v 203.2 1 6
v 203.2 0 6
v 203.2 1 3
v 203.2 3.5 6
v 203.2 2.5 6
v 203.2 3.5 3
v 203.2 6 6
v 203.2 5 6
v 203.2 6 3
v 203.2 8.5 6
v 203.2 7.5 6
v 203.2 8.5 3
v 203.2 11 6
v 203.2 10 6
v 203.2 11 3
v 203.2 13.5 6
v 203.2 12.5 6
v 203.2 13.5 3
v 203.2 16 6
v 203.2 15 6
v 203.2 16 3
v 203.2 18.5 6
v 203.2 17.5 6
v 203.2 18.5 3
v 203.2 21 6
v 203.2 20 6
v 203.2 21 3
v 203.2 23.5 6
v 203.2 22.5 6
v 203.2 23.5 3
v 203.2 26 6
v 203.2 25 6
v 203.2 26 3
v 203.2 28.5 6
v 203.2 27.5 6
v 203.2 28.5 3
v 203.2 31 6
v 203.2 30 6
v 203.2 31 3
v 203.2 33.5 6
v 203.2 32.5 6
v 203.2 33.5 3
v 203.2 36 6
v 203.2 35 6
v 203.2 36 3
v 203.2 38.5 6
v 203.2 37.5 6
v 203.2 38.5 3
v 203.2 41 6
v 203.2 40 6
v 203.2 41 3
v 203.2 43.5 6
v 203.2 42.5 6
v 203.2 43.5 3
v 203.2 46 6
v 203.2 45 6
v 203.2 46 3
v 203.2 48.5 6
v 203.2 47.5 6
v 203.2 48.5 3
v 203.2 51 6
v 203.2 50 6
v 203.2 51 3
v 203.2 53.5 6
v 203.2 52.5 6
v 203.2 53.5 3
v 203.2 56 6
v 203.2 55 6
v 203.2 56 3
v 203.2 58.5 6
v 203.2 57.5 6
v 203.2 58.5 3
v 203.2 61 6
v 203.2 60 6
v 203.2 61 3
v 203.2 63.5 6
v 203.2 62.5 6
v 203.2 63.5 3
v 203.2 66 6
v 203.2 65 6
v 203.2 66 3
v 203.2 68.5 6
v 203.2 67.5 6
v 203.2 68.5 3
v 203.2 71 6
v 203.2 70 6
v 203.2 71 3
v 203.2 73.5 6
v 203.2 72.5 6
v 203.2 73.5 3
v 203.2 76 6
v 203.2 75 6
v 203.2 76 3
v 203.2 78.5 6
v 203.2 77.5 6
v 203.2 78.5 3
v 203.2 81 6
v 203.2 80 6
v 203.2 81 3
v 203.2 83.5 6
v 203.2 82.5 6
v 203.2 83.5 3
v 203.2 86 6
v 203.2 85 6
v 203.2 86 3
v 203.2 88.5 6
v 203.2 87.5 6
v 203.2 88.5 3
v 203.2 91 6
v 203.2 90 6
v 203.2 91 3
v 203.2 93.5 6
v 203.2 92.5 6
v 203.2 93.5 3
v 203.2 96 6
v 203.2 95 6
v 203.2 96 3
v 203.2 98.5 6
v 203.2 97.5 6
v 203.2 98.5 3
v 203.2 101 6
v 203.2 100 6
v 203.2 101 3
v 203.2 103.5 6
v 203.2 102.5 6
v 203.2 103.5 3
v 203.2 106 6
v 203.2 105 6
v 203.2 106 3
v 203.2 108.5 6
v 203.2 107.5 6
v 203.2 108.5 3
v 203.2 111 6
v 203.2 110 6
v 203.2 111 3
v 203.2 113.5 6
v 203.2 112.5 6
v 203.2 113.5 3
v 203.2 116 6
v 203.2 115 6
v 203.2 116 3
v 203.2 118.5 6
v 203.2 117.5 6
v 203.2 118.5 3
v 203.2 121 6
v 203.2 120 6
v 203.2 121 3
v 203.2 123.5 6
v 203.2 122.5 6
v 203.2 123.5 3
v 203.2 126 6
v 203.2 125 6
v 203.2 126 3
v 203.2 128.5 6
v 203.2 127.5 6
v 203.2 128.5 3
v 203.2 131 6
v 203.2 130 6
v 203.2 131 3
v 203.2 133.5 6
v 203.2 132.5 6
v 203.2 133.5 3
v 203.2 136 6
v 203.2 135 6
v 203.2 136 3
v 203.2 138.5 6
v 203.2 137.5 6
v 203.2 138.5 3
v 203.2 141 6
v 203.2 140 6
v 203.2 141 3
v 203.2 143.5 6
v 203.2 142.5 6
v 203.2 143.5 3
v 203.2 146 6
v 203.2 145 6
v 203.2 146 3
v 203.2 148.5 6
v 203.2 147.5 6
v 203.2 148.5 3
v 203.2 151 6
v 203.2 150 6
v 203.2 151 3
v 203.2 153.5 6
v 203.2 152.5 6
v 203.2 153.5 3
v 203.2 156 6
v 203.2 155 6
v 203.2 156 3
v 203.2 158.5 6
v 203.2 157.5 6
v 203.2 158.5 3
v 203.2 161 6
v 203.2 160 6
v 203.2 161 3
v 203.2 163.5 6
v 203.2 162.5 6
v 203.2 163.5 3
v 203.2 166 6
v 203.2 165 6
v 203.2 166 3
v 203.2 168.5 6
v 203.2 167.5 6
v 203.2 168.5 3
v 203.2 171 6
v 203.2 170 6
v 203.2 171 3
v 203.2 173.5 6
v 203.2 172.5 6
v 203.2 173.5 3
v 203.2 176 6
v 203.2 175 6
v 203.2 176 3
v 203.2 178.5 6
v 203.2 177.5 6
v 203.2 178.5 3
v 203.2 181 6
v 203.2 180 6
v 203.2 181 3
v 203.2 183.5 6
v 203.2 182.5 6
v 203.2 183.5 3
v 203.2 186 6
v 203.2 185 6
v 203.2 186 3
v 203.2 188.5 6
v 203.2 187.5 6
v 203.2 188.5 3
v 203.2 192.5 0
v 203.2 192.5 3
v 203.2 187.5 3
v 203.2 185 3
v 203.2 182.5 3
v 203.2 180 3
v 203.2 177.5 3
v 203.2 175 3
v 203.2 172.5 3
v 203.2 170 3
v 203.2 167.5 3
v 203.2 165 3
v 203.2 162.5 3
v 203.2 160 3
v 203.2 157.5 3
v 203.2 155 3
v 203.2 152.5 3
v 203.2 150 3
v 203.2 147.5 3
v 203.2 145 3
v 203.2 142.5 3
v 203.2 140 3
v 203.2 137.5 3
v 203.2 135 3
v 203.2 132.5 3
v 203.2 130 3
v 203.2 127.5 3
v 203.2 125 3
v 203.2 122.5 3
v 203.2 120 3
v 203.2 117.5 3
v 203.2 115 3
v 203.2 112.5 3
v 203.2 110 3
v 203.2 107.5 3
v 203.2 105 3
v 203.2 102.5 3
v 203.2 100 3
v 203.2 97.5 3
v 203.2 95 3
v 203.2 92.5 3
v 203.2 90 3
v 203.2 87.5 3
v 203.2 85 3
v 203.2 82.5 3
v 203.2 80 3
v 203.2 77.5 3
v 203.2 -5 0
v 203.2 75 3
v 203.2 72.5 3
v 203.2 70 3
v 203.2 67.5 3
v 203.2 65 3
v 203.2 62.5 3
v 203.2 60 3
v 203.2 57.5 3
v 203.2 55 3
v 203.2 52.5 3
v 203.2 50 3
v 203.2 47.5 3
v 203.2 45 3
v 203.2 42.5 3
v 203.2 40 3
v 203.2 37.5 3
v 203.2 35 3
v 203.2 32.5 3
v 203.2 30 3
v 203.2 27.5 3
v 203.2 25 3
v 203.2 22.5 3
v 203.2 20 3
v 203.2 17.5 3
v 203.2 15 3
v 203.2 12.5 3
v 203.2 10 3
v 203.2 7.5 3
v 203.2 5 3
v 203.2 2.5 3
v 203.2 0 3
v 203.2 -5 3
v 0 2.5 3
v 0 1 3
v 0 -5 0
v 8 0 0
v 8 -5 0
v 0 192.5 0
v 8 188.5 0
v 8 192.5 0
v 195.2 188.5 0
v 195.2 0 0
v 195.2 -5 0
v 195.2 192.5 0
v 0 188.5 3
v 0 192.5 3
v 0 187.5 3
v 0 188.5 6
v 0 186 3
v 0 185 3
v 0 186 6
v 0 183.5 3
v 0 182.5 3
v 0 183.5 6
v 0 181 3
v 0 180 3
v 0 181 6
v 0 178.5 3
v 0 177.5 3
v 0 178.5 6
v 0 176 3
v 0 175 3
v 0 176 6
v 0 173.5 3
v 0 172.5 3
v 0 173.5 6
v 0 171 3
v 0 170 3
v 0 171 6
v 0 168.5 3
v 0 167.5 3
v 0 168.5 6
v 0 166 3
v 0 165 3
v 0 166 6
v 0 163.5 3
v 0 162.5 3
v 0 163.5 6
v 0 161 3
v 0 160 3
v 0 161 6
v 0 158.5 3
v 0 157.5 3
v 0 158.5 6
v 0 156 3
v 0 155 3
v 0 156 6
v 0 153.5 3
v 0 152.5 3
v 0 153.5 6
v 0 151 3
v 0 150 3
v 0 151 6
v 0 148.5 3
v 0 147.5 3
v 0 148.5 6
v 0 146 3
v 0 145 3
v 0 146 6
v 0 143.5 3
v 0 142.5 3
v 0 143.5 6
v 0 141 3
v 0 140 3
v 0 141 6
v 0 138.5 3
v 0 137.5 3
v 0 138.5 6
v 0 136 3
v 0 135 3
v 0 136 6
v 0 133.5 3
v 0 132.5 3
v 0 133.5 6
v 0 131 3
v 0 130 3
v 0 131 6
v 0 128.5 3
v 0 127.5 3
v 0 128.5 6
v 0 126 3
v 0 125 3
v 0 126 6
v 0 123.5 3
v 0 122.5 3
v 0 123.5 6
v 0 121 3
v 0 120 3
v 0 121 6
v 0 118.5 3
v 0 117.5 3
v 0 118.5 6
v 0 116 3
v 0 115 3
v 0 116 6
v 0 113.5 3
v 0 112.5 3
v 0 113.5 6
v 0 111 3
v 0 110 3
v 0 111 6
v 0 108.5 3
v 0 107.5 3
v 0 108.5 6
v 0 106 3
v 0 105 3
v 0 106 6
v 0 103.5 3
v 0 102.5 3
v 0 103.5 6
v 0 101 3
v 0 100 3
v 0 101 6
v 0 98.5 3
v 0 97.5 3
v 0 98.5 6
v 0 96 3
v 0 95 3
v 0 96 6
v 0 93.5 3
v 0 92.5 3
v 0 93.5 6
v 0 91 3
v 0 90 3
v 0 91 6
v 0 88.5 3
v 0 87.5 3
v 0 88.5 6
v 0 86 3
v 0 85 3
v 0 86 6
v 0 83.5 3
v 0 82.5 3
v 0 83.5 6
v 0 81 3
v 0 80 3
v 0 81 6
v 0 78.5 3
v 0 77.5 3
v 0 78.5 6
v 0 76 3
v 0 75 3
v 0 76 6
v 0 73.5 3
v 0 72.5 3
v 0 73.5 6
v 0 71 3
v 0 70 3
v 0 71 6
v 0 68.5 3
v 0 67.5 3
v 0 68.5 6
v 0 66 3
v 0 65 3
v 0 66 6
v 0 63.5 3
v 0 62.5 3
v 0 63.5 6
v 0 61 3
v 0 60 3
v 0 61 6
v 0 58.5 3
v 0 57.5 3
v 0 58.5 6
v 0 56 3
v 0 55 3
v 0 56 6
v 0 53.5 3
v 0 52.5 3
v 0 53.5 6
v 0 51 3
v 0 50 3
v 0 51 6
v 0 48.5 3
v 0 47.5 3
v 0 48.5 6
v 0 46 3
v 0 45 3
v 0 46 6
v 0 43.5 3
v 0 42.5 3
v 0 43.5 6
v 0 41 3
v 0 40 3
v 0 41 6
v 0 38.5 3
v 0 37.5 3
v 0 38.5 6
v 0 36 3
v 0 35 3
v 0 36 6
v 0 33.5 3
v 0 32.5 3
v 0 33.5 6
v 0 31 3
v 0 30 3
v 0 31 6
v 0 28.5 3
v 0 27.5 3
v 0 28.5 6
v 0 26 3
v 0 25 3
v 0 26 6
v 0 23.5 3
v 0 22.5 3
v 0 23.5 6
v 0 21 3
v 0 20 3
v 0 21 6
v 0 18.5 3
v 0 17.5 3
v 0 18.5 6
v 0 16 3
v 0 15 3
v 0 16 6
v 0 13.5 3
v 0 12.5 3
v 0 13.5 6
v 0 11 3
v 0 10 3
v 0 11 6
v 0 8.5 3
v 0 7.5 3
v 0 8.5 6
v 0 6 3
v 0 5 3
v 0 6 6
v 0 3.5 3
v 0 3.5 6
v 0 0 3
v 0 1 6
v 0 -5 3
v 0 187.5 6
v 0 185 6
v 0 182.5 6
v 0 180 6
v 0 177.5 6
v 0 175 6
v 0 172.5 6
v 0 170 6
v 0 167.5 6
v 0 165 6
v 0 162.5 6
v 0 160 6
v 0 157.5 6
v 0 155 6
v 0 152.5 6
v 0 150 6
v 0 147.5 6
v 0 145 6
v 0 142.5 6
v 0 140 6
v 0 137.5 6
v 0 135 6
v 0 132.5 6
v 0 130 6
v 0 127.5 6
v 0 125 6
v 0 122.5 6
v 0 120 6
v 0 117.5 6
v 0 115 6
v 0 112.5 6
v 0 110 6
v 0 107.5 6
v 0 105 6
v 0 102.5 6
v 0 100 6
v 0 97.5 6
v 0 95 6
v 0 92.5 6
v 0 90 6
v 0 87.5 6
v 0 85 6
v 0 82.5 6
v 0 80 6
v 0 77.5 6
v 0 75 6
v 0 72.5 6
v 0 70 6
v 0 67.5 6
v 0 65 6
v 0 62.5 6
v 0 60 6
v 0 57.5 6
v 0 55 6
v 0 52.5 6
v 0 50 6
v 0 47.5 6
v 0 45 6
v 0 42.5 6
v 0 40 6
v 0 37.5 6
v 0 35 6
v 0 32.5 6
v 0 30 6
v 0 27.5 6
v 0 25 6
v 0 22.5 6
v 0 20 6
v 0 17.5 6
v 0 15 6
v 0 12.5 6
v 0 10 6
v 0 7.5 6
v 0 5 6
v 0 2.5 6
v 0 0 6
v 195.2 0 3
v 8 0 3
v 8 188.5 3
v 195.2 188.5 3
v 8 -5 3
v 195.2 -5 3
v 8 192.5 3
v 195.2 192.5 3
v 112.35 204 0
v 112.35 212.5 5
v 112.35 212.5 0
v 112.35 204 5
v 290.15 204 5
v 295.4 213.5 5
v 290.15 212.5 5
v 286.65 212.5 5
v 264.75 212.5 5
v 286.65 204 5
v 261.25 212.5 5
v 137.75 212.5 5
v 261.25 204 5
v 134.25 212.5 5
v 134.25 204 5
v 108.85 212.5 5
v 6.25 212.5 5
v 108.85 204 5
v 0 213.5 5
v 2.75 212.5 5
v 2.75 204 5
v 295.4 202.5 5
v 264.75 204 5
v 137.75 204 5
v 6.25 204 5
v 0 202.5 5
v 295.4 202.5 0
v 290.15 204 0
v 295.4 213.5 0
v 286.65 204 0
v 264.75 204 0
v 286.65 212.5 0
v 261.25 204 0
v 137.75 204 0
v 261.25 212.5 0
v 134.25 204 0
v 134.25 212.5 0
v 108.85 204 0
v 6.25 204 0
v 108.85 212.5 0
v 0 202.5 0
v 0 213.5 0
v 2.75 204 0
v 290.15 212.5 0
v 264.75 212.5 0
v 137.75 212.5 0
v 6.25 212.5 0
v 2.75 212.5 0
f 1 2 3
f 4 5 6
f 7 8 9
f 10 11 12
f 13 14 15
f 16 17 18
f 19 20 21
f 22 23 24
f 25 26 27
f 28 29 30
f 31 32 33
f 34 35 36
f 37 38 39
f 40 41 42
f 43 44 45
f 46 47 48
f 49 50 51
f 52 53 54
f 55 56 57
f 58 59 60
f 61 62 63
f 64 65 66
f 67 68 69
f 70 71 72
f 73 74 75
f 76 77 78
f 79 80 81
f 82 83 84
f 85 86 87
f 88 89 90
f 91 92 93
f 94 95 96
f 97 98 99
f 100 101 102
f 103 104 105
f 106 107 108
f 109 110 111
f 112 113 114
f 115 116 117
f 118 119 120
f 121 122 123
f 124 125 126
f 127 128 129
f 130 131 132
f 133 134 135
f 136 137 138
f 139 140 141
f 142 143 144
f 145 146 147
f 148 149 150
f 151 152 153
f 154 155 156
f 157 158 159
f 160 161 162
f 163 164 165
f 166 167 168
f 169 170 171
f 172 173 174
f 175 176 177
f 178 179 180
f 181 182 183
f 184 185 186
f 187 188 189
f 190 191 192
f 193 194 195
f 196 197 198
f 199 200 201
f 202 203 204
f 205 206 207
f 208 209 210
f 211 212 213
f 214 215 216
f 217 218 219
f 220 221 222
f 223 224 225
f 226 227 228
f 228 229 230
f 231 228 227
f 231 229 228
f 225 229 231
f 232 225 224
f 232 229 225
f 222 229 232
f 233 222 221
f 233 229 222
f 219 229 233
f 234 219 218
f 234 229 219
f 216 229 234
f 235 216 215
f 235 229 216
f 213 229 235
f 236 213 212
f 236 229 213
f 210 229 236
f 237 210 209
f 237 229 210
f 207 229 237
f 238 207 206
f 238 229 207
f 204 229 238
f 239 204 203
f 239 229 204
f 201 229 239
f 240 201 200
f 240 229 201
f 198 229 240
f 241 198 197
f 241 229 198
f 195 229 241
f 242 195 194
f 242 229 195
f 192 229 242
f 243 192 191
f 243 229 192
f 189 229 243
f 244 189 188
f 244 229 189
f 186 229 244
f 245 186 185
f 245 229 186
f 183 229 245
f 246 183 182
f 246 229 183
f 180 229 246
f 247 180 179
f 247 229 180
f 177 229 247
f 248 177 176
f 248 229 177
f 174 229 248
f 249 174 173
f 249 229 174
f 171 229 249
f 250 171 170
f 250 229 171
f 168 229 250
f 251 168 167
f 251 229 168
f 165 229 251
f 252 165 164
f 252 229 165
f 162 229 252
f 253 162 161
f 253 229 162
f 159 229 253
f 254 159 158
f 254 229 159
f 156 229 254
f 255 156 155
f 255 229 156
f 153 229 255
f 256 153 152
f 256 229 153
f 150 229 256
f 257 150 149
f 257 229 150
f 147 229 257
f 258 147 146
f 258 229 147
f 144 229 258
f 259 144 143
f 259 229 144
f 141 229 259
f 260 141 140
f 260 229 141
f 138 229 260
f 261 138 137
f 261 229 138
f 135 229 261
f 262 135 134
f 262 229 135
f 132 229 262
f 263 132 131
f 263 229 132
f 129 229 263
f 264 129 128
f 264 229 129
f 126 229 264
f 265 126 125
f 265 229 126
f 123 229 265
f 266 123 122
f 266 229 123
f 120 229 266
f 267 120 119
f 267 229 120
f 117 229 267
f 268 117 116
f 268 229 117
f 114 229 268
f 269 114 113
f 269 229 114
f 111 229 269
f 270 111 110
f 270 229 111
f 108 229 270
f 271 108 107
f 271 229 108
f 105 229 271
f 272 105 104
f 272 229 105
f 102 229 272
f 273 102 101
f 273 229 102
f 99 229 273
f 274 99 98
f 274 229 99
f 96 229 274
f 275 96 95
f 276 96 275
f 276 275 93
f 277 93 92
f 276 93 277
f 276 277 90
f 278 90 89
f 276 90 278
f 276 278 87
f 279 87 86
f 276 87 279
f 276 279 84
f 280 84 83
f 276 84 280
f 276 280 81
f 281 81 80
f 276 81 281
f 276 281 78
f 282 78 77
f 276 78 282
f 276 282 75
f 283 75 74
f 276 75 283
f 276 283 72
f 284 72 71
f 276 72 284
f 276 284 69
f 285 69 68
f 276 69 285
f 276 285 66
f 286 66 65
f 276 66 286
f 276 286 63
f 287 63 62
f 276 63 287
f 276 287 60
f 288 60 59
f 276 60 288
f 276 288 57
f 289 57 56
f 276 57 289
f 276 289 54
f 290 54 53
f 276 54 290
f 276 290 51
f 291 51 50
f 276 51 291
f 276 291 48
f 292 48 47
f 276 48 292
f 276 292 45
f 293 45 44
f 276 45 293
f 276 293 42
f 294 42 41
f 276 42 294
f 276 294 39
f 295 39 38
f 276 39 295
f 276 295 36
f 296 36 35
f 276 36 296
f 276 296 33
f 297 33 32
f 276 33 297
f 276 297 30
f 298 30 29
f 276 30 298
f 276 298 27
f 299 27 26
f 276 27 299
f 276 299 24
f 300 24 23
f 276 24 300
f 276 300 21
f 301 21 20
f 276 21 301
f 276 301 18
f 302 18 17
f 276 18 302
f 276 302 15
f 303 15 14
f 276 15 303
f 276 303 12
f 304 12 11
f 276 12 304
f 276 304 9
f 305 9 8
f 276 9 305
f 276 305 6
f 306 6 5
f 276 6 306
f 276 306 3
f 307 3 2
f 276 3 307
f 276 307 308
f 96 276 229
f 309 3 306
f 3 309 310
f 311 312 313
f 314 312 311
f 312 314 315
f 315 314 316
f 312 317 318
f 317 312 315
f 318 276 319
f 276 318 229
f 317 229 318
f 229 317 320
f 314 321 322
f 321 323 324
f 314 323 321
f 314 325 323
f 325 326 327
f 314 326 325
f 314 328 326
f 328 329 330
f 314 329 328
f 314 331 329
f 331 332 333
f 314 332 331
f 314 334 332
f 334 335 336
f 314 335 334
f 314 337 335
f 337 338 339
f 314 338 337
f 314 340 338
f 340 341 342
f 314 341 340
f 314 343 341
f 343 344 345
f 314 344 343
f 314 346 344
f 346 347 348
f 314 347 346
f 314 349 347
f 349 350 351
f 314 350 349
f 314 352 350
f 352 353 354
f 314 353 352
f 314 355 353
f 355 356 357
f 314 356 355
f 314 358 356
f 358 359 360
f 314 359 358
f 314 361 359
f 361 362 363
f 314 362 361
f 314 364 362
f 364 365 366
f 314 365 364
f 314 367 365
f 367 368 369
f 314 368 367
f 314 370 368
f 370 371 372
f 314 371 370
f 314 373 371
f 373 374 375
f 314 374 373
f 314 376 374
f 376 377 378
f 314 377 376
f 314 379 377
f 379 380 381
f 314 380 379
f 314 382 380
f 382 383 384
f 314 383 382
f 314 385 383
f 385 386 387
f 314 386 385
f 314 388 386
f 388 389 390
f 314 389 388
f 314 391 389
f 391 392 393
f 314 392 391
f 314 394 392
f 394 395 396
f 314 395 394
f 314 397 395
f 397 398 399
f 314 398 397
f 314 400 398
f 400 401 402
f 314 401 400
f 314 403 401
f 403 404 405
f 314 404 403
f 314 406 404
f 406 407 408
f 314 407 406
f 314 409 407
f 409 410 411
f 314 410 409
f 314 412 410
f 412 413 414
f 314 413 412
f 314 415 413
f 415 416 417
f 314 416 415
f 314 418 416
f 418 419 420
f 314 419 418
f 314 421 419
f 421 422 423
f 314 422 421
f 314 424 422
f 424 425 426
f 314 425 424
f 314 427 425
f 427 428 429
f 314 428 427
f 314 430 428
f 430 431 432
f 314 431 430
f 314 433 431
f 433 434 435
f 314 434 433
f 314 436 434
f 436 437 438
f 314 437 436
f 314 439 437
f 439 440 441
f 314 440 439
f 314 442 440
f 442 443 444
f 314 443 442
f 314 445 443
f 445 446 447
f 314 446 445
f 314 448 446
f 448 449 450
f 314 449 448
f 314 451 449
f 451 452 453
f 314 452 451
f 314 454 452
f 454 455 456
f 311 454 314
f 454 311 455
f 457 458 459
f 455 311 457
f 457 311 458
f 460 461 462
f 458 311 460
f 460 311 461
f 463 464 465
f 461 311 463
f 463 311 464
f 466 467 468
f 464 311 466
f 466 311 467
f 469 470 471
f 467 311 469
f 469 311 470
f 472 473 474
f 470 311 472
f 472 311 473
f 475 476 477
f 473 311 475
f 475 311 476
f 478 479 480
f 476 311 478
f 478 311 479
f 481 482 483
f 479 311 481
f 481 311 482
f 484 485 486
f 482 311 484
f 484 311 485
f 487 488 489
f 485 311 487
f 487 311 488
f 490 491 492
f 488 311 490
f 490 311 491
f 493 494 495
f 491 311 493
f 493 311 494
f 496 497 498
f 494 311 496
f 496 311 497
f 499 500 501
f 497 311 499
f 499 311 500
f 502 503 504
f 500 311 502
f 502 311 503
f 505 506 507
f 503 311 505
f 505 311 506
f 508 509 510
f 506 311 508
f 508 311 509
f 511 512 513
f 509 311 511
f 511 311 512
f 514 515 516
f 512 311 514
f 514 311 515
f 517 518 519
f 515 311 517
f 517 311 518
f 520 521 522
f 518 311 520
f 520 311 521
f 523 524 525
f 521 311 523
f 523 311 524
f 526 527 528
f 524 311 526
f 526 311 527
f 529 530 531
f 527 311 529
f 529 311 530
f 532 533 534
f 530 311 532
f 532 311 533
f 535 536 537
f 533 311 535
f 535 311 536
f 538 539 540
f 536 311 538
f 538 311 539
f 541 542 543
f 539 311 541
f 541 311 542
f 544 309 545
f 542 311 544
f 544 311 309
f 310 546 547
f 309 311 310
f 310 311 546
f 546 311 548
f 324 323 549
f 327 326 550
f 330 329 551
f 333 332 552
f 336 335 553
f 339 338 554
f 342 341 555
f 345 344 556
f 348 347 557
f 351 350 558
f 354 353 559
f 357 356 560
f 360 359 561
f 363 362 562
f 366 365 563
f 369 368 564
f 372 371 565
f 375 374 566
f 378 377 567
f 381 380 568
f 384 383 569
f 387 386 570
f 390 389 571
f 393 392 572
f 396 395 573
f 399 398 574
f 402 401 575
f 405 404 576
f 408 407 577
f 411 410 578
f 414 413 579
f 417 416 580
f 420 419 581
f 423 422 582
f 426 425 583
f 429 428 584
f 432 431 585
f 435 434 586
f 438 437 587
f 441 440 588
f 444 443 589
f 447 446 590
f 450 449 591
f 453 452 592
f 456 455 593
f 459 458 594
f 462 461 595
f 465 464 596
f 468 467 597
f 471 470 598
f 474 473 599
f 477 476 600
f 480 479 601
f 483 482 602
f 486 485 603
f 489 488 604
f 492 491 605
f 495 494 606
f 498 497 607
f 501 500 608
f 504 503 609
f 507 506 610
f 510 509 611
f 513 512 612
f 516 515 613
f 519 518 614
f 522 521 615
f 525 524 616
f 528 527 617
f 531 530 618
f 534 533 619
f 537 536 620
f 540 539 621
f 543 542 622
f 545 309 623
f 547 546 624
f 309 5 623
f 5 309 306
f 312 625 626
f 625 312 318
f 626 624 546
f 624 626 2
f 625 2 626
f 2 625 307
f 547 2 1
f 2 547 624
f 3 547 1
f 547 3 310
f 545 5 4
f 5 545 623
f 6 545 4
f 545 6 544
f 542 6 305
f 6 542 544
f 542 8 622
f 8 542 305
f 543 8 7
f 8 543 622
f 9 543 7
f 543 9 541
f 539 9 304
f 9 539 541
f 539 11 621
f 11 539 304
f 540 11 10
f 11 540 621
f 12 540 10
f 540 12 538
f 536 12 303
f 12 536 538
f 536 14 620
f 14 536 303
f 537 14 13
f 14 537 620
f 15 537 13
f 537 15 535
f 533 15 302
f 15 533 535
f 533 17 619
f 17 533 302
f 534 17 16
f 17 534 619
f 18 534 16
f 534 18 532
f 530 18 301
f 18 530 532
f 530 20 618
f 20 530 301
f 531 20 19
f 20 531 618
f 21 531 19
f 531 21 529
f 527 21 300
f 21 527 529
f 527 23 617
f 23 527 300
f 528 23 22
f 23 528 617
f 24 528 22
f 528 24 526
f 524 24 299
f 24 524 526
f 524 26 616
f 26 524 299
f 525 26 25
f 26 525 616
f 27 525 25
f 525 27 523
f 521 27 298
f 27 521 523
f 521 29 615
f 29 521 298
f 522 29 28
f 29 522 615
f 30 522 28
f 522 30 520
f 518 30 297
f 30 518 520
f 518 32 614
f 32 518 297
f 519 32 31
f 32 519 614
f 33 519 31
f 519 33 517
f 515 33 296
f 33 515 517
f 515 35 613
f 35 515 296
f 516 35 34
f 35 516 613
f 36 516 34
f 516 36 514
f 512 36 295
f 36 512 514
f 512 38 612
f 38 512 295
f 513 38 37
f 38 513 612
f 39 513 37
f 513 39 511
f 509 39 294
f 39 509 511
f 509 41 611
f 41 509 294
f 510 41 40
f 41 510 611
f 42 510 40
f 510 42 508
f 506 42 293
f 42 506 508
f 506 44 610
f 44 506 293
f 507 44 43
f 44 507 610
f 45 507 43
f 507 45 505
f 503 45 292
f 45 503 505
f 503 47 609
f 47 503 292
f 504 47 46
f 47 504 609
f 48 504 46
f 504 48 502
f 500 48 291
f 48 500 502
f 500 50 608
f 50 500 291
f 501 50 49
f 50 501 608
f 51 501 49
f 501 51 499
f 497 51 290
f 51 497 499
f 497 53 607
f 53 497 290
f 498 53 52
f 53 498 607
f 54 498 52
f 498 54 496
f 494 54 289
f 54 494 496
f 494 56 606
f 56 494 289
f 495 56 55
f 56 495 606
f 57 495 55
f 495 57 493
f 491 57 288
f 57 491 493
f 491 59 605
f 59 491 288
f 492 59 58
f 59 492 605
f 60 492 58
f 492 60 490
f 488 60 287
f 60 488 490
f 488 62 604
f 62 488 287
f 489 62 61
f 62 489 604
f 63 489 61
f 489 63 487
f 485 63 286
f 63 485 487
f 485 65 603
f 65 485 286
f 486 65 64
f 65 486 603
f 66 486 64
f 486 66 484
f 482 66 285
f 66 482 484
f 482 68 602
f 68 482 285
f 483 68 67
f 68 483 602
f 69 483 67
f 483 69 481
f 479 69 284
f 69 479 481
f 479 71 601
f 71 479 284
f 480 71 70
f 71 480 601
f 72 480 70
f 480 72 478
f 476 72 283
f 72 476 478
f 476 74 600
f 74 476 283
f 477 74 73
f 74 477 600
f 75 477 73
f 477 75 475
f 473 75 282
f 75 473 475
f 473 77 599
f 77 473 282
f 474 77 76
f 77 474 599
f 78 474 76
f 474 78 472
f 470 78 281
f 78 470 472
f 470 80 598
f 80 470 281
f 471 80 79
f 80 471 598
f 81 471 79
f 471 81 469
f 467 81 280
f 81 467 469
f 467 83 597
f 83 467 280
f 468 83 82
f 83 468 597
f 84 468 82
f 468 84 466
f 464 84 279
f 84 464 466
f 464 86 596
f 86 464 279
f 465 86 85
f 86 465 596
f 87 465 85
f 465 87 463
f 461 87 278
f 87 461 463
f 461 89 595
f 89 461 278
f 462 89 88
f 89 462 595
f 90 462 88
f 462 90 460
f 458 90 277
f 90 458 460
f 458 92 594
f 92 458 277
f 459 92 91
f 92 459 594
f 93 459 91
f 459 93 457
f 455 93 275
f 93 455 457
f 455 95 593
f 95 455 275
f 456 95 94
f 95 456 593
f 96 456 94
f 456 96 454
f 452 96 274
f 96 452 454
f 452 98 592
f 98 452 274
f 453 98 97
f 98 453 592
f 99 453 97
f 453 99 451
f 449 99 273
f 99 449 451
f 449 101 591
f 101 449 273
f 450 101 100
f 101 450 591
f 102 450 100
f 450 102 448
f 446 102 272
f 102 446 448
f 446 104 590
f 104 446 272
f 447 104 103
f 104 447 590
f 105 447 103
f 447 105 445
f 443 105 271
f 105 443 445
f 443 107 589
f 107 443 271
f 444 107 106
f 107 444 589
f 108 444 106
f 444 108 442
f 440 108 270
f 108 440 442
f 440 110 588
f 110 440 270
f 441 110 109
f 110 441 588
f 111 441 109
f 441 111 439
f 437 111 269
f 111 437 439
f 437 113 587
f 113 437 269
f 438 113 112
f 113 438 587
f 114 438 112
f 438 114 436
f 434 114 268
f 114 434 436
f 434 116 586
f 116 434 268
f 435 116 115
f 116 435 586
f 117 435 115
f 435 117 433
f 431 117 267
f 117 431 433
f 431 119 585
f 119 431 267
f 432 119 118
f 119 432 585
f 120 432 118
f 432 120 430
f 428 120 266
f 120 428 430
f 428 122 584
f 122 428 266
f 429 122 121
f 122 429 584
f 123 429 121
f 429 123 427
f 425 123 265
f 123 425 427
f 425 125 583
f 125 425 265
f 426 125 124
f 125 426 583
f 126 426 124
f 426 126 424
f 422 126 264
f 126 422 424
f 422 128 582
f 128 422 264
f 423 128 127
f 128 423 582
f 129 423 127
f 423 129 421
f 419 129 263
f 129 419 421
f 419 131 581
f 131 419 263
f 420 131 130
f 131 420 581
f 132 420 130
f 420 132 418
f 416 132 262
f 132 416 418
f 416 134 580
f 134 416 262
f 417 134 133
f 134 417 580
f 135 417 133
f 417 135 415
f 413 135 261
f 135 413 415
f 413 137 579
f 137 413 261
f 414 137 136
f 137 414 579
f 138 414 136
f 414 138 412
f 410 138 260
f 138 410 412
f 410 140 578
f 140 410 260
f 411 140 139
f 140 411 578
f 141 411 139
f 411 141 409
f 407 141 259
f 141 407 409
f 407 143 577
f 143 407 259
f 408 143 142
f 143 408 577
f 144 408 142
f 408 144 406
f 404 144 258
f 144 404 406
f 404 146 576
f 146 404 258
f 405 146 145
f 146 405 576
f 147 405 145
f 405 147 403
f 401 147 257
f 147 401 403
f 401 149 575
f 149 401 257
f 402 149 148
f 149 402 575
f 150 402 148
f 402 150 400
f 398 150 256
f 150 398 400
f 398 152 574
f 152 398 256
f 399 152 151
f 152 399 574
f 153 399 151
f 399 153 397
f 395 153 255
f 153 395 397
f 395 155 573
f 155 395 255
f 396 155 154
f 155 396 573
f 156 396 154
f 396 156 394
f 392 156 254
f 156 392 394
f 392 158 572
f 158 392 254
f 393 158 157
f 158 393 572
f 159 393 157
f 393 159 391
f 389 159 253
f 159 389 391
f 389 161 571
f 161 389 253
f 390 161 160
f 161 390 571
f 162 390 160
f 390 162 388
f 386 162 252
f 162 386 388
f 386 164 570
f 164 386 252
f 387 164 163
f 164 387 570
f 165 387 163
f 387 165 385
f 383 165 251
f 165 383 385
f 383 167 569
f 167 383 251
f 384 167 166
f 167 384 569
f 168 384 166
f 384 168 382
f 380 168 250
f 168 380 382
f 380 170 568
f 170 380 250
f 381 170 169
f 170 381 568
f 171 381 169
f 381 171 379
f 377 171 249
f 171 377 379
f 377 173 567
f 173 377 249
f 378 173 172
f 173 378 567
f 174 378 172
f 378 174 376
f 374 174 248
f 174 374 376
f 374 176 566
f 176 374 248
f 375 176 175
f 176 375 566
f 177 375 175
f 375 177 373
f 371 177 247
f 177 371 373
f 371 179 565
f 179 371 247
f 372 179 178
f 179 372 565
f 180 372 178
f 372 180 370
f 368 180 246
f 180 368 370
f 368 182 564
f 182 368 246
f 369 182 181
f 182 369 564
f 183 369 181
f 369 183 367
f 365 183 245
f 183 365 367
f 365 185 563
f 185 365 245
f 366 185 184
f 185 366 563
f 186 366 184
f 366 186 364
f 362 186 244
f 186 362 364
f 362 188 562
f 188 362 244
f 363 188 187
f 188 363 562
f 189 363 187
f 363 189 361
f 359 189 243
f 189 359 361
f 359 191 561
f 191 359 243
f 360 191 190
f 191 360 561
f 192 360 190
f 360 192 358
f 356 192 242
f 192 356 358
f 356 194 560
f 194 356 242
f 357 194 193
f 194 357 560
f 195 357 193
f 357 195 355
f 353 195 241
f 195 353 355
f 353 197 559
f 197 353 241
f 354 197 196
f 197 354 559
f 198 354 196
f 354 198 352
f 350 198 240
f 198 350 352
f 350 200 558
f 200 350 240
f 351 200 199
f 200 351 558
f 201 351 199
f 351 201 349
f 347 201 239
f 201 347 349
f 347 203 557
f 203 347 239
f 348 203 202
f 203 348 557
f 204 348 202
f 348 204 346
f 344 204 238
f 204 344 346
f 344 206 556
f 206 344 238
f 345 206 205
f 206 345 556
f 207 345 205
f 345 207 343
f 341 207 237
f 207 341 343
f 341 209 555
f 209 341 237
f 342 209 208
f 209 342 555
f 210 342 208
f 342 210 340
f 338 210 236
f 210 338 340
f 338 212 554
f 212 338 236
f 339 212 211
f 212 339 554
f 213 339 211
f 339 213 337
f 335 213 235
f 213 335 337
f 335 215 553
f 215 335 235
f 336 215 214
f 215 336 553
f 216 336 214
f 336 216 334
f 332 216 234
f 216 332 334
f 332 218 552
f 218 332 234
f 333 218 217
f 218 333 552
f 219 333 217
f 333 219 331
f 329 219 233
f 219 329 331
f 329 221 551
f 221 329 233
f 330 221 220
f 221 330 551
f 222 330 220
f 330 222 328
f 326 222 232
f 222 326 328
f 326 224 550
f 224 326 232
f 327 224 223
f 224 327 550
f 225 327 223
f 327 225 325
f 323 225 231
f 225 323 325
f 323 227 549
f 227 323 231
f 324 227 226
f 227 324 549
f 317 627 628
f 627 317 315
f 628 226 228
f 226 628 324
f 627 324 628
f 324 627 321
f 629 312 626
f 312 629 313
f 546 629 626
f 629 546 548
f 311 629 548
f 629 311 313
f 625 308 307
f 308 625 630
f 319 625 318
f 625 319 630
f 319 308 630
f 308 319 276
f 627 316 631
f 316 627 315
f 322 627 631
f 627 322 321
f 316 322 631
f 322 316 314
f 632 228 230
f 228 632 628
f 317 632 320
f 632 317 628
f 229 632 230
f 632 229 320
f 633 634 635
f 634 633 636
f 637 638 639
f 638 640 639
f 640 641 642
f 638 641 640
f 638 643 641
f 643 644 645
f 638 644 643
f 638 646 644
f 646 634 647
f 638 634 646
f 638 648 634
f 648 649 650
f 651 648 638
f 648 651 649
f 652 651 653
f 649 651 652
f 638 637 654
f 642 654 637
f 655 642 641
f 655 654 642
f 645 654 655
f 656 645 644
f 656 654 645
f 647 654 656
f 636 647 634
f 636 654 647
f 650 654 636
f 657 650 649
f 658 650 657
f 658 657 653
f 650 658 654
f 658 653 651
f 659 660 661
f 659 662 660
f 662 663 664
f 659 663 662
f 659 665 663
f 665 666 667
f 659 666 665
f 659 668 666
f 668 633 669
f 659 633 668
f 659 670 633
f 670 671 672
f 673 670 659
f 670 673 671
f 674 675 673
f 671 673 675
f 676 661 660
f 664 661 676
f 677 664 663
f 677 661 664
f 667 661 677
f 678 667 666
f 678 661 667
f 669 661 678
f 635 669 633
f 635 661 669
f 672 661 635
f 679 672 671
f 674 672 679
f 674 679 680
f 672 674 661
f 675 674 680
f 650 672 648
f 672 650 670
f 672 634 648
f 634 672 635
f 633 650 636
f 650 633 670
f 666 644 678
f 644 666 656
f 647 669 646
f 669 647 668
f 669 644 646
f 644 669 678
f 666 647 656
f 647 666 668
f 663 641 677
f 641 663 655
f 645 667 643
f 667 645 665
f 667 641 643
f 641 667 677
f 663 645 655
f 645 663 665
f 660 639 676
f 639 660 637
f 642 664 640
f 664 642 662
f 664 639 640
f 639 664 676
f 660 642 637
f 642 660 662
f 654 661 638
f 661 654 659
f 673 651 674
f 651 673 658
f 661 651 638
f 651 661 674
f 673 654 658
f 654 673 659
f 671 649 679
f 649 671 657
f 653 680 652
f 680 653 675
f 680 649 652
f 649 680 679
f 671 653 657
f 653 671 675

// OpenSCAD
/* [Build Params] */

//Units used for paper sizing (inches or millimeters)
PAPER_UNITS = "inch"; //["inch","mm"]

//Height (smaller side) of the largest paper size to be supported.  This can be undersized slightly as the paper can overhang the dryer a bit (ex, 8 can hold 8.5x11 paper)
MAX_PAPER_HEIGHT = 8; 

//Array of the different paper widths (larger side) to be supported 
PAPER_WIDTH = [4,5,10,11];

//Amount in mm to oversize paper dimensions
PAPER_TOLERANCE =1; //[0.0:5.0]

//Maximum number of sheets to hold.  NOTE: Larger slot counts may create performance issues when slicing.
SLOT_COUNT = 75; //[5:200]

//Thickness of each sheet slot (mm)
SLOT_THICK = 1.5; //[0.5:10.0]

//Thickness of the tabs separating each slot (mm)
TAB_THICK = 1; //[0.5:5.0]

//How far each separating tab sticks out (mm)
TAB_WIDTH = 3; //[1:10]

//Thickness of the sides (mm)
SIDE_WALL_THICK = 3; //[1:10]

//Thickness of the base (mm)
BASE_THICK = 5; //[1:10]

//Width of the tabs that seat the sides to the base (mm)
BASE_TAB_WIDTH = 8; //[2:20]

//How far in to cut the chamfers on the ends of the base (mm)
BASE_CHAMFER_DIST = 0; //[0:20]

//How much to oversize the holes in the base to fit the corresponding tabs (mm)
BASE_TAB_TOLERANCE = .5; //[0.0:2.0]



/* [Advanced] */

//False will render 1 copy of each part.  True will render 2 sides and 4 base brackets.
BUILD_ALL_PARTS = false;

//Distance between each part in the render (mm)
PART_OFFSET = 10;

module buildBaseInch()
{
    maxWidth = inchToMM(max(PAPER_WIDTH));
    t= BASE_TAB_TOLERANCE;
    difference()
    {
        cube([maxWidth+(SIDE_WALL_THICK * 4)+PAPER_TOLERANCE*len(PAPER_WIDTH),BASE_TAB_WIDTH + SIDE_WALL_THICK,BASE_THICK]);
        translate([SIDE_WALL_THICK-t/2,SIDE_WALL_THICK/2,0])
        {
            cube([SIDE_WALL_THICK+t,BASE_TAB_WIDTH+t,BASE_THICK]);
        }
        for (wCount = [0:1:len(PAPER_WIDTH)-1])
        {   
            width = inchToMM(PAPER_WIDTH[wCount])+SIDE_WALL_THICK*2;
            translate([width+t/2+PAPER_TOLERANCE,SIDE_WALL_THICK/2,0])
            {
                cube([SIDE_WALL_THICK+t,BASE_TAB_WIDTH+t,BASE_THICK]);
            }
        }
        
        zeroChamfer = sqrt((BASE_TAB_WIDTH*BASE_TAB_WIDTH)/2)*2;
        translate([0,-zeroChamfer+BASE_CHAMFER_DIST,0])rotate([0,0,45])cube([BASE_TAB_WIDTH,BASE_TAB_WIDTH,BASE_TAB_WIDTH]);
        translate([maxWidth+(SIDE_WALL_THICK * 4)+PAPER_TOLERANCE*len(PAPER_WIDTH),-zeroChamfer+BASE_CHAMFER_DIST,0])rotate([0,0,45])cube([BASE_TAB_WIDTH,BASE_TAB_WIDTH,BASE_TAB_WIDTH]);
        translate([0,BASE_TAB_WIDTH + SIDE_WALL_THICK-BASE_CHAMFER_DIST,0])rotate([0,0,45])cube([BASE_TAB_WIDTH,BASE_TAB_WIDTH,BASE_TAB_WIDTH]);
        translate([maxWidth+(SIDE_WALL_THICK * 4)+PAPER_TOLERANCE*len(PAPER_WIDTH),BASE_TAB_WIDTH + SIDE_WALL_THICK-BASE_CHAMFER_DIST,0])rotate([0,0,45])cube([BASE_TAB_WIDTH,BASE_TAB_WIDTH,BASE_TAB_WIDTH]);
    }

}
module buildBaseMM()
{
    maxWidth = max(PAPER_WIDTH);
    t= BASE_TAB_TOLERANCE;
    difference()
    {
        cube([maxWidth+(SIDE_WALL_THICK * 4)+PAPER_TOLERANCE*len(PAPER_WIDTH),BASE_TAB_WIDTH + SIDE_WALL_THICK,BASE_THICK]);
        translate([SIDE_WALL_THICK-t/2,SIDE_WALL_THICK/2,0])
        {
            cube([SIDE_WALL_THICK+t,BASE_TAB_WIDTH+t,BASE_THICK]);
        }
        for (wCount = [0:1:len(PAPER_WIDTH)-1])
        {   
            width = PAPER_WIDTH[wCount]+SIDE_WALL_THICK*2;
            translate([width+t/2+PAPER_TOLERANCE,SIDE_WALL_THICK/2,0])
            {
                cube([SIDE_WALL_THICK+t,BASE_TAB_WIDTH+t,BASE_THICK]);
            }
        }
        zeroChamfer = sqrt((BASE_TAB_WIDTH*BASE_TAB_WIDTH)/2)*2;
        translate([0,-zeroChamfer+BASE_CHAMFER_DIST,0])rotate([0,0,45])cube([BASE_TAB_WIDTH,BASE_TAB_WIDTH,BASE_TAB_WIDTH]);
        translate([maxWidth+(SIDE_WALL_THICK * 4),-zeroChamfer+BASE_CHAMFER_DIST,0])rotate([0,0,45])cube([BASE_TAB_WIDTH,BASE_TAB_WIDTH,BASE_TAB_WIDTH]);
        translate([0,BASE_TAB_WIDTH + SIDE_WALL_THICK-BASE_CHAMFER_DIST,0])rotate([0,0,45])cube([BASE_TAB_WIDTH,BASE_TAB_WIDTH,BASE_TAB_WIDTH]);
        translate([maxWidth+(SIDE_WALL_THICK * 4),BASE_TAB_WIDTH + SIDE_WALL_THICK-BASE_CHAMFER_DIST,0])rotate([0,0,45])cube([BASE_TAB_WIDTH,BASE_TAB_WIDTH,BASE_TAB_WIDTH]);
    }
}

module buildBases()
{   
    if(BUILD_ALL_PARTS)
    {
        for( bCount = [0:1:3])
        {
            if(PAPER_UNITS == "inch")
                translate([0,(BASE_TAB_WIDTH + SIDE_WALL_THICK + PART_OFFSET)* bCount,0])   buildBaseInch();
            else
                translate([0,(BASE_TAB_WIDTH + SIDE_WALL_THICK + PART_OFFSET)* bCount,0])   buildBaseMM();

        }
    }
    else
    {
        if(PAPER_UNITS == "inch")
            buildBaseInch();
        else
            buildBaseMM();
    }

}
module buildSide()
{
    for ( slot = [0 :1:SLOT_COUNT-1] )
    {
        translate([0,slot*(SLOT_THICK+TAB_THICK),0])
        {
            if(PAPER_UNITS == "inch")
                buildSideSlotInch();
            else
                buildSideSlotMM();
        }
    
    }
    if(PAPER_UNITS == "inch")
        buildSideTabsInch();
    else
        buildSideTabsMM();
}
module buildSideTabsInch()
{
    maxDepth = inchToMM(MAX_PAPER_HEIGHT);

    translate([0,-BASE_THICK,0])   cube([BASE_TAB_WIDTH,BASE_THICK,SIDE_WALL_THICK]);
    translate([maxDepth-BASE_TAB_WIDTH,-BASE_THICK,0])   cube([BASE_TAB_WIDTH,BASE_THICK,SIDE_WALL_THICK]);
    translate([0,(SLOT_THICK+TAB_THICK)*SLOT_COUNT,0])   cube([BASE_TAB_WIDTH,BASE_THICK,SIDE_WALL_THICK]);
    translate([maxDepth-BASE_TAB_WIDTH,(SLOT_THICK+TAB_THICK)*SLOT_COUNT,0])   cube([BASE_TAB_WIDTH,BASE_THICK,SIDE_WALL_THICK]);

}module buildSideTabsMM()
{
    maxDepth = MAX_PAPER_HEIGHT;

    translate([0,-BASE_THICK,0])   cube([BASE_TAB_WIDTH,BASE_THICK,SIDE_WALL_THICK]);
    translate([maxDepth-BASE_TAB_WIDTH,-BASE_THICK,0])   cube([BASE_TAB_WIDTH,BASE_THICK,SIDE_WALL_THICK]);
    translate([0,(SLOT_THICK+TAB_THICK)*SLOT_COUNT,0])   cube([BASE_TAB_WIDTH,BASE_THICK,SIDE_WALL_THICK]);
    translate([maxDepth-BASE_TAB_WIDTH,(SLOT_THICK+TAB_THICK)*SLOT_COUNT,0])   cube([BASE_TAB_WIDTH,BASE_THICK,SIDE_WALL_THICK]);

}

module buildSideSlotInch()
{
        maxDepth = inchToMM(MAX_PAPER_HEIGHT);
        cube([maxDepth,SLOT_THICK+TAB_THICK,SIDE_WALL_THICK]);
        cube([maxDepth,TAB_THICK,SIDE_WALL_THICK+TAB_WIDTH]);
        translate([0,SLOT_THICK+TAB_THICK,0]) cube([maxDepth,TAB_THICK,SIDE_WALL_THICK+TAB_WIDTH]);

}

module buildSideSlotMM()
{
        maxDepth = MAX_PAPER_HEIGHT;
        cube([maxDepth,SLOT_THICK+TAB_THICK,SIDE_WALL_THICK]);
        cube([maxDepth,TAB_THICK,SIDE_WALL_THICK+TAB_WIDTH]);
        translate([0,SLOT_THICK+TAB_THICK,0]) cube([maxDepth,TAB_THICK,SIDE_WALL_THICK+TAB_WIDTH]);

}

module build()
{
    buildSide();
    
    if(BUILD_ALL_PARTS)
    {

        translate([0,(SLOT_THICK+TAB_THICK)*SLOT_COUNT+BASE_THICK*2+PART_OFFSET,0]) buildSide();
        translate([0,((SLOT_THICK+TAB_THICK)*SLOT_COUNT+BASE_THICK*2)*2+PART_OFFSET*2,0])buildBases();
    }
    else
    {
        translate([0,((SLOT_THICK+TAB_THICK)*SLOT_COUNT+BASE_THICK)+PART_OFFSET,0])buildBases();
    }
}

function inchToMM(inches) = inches*25.4;

build();
